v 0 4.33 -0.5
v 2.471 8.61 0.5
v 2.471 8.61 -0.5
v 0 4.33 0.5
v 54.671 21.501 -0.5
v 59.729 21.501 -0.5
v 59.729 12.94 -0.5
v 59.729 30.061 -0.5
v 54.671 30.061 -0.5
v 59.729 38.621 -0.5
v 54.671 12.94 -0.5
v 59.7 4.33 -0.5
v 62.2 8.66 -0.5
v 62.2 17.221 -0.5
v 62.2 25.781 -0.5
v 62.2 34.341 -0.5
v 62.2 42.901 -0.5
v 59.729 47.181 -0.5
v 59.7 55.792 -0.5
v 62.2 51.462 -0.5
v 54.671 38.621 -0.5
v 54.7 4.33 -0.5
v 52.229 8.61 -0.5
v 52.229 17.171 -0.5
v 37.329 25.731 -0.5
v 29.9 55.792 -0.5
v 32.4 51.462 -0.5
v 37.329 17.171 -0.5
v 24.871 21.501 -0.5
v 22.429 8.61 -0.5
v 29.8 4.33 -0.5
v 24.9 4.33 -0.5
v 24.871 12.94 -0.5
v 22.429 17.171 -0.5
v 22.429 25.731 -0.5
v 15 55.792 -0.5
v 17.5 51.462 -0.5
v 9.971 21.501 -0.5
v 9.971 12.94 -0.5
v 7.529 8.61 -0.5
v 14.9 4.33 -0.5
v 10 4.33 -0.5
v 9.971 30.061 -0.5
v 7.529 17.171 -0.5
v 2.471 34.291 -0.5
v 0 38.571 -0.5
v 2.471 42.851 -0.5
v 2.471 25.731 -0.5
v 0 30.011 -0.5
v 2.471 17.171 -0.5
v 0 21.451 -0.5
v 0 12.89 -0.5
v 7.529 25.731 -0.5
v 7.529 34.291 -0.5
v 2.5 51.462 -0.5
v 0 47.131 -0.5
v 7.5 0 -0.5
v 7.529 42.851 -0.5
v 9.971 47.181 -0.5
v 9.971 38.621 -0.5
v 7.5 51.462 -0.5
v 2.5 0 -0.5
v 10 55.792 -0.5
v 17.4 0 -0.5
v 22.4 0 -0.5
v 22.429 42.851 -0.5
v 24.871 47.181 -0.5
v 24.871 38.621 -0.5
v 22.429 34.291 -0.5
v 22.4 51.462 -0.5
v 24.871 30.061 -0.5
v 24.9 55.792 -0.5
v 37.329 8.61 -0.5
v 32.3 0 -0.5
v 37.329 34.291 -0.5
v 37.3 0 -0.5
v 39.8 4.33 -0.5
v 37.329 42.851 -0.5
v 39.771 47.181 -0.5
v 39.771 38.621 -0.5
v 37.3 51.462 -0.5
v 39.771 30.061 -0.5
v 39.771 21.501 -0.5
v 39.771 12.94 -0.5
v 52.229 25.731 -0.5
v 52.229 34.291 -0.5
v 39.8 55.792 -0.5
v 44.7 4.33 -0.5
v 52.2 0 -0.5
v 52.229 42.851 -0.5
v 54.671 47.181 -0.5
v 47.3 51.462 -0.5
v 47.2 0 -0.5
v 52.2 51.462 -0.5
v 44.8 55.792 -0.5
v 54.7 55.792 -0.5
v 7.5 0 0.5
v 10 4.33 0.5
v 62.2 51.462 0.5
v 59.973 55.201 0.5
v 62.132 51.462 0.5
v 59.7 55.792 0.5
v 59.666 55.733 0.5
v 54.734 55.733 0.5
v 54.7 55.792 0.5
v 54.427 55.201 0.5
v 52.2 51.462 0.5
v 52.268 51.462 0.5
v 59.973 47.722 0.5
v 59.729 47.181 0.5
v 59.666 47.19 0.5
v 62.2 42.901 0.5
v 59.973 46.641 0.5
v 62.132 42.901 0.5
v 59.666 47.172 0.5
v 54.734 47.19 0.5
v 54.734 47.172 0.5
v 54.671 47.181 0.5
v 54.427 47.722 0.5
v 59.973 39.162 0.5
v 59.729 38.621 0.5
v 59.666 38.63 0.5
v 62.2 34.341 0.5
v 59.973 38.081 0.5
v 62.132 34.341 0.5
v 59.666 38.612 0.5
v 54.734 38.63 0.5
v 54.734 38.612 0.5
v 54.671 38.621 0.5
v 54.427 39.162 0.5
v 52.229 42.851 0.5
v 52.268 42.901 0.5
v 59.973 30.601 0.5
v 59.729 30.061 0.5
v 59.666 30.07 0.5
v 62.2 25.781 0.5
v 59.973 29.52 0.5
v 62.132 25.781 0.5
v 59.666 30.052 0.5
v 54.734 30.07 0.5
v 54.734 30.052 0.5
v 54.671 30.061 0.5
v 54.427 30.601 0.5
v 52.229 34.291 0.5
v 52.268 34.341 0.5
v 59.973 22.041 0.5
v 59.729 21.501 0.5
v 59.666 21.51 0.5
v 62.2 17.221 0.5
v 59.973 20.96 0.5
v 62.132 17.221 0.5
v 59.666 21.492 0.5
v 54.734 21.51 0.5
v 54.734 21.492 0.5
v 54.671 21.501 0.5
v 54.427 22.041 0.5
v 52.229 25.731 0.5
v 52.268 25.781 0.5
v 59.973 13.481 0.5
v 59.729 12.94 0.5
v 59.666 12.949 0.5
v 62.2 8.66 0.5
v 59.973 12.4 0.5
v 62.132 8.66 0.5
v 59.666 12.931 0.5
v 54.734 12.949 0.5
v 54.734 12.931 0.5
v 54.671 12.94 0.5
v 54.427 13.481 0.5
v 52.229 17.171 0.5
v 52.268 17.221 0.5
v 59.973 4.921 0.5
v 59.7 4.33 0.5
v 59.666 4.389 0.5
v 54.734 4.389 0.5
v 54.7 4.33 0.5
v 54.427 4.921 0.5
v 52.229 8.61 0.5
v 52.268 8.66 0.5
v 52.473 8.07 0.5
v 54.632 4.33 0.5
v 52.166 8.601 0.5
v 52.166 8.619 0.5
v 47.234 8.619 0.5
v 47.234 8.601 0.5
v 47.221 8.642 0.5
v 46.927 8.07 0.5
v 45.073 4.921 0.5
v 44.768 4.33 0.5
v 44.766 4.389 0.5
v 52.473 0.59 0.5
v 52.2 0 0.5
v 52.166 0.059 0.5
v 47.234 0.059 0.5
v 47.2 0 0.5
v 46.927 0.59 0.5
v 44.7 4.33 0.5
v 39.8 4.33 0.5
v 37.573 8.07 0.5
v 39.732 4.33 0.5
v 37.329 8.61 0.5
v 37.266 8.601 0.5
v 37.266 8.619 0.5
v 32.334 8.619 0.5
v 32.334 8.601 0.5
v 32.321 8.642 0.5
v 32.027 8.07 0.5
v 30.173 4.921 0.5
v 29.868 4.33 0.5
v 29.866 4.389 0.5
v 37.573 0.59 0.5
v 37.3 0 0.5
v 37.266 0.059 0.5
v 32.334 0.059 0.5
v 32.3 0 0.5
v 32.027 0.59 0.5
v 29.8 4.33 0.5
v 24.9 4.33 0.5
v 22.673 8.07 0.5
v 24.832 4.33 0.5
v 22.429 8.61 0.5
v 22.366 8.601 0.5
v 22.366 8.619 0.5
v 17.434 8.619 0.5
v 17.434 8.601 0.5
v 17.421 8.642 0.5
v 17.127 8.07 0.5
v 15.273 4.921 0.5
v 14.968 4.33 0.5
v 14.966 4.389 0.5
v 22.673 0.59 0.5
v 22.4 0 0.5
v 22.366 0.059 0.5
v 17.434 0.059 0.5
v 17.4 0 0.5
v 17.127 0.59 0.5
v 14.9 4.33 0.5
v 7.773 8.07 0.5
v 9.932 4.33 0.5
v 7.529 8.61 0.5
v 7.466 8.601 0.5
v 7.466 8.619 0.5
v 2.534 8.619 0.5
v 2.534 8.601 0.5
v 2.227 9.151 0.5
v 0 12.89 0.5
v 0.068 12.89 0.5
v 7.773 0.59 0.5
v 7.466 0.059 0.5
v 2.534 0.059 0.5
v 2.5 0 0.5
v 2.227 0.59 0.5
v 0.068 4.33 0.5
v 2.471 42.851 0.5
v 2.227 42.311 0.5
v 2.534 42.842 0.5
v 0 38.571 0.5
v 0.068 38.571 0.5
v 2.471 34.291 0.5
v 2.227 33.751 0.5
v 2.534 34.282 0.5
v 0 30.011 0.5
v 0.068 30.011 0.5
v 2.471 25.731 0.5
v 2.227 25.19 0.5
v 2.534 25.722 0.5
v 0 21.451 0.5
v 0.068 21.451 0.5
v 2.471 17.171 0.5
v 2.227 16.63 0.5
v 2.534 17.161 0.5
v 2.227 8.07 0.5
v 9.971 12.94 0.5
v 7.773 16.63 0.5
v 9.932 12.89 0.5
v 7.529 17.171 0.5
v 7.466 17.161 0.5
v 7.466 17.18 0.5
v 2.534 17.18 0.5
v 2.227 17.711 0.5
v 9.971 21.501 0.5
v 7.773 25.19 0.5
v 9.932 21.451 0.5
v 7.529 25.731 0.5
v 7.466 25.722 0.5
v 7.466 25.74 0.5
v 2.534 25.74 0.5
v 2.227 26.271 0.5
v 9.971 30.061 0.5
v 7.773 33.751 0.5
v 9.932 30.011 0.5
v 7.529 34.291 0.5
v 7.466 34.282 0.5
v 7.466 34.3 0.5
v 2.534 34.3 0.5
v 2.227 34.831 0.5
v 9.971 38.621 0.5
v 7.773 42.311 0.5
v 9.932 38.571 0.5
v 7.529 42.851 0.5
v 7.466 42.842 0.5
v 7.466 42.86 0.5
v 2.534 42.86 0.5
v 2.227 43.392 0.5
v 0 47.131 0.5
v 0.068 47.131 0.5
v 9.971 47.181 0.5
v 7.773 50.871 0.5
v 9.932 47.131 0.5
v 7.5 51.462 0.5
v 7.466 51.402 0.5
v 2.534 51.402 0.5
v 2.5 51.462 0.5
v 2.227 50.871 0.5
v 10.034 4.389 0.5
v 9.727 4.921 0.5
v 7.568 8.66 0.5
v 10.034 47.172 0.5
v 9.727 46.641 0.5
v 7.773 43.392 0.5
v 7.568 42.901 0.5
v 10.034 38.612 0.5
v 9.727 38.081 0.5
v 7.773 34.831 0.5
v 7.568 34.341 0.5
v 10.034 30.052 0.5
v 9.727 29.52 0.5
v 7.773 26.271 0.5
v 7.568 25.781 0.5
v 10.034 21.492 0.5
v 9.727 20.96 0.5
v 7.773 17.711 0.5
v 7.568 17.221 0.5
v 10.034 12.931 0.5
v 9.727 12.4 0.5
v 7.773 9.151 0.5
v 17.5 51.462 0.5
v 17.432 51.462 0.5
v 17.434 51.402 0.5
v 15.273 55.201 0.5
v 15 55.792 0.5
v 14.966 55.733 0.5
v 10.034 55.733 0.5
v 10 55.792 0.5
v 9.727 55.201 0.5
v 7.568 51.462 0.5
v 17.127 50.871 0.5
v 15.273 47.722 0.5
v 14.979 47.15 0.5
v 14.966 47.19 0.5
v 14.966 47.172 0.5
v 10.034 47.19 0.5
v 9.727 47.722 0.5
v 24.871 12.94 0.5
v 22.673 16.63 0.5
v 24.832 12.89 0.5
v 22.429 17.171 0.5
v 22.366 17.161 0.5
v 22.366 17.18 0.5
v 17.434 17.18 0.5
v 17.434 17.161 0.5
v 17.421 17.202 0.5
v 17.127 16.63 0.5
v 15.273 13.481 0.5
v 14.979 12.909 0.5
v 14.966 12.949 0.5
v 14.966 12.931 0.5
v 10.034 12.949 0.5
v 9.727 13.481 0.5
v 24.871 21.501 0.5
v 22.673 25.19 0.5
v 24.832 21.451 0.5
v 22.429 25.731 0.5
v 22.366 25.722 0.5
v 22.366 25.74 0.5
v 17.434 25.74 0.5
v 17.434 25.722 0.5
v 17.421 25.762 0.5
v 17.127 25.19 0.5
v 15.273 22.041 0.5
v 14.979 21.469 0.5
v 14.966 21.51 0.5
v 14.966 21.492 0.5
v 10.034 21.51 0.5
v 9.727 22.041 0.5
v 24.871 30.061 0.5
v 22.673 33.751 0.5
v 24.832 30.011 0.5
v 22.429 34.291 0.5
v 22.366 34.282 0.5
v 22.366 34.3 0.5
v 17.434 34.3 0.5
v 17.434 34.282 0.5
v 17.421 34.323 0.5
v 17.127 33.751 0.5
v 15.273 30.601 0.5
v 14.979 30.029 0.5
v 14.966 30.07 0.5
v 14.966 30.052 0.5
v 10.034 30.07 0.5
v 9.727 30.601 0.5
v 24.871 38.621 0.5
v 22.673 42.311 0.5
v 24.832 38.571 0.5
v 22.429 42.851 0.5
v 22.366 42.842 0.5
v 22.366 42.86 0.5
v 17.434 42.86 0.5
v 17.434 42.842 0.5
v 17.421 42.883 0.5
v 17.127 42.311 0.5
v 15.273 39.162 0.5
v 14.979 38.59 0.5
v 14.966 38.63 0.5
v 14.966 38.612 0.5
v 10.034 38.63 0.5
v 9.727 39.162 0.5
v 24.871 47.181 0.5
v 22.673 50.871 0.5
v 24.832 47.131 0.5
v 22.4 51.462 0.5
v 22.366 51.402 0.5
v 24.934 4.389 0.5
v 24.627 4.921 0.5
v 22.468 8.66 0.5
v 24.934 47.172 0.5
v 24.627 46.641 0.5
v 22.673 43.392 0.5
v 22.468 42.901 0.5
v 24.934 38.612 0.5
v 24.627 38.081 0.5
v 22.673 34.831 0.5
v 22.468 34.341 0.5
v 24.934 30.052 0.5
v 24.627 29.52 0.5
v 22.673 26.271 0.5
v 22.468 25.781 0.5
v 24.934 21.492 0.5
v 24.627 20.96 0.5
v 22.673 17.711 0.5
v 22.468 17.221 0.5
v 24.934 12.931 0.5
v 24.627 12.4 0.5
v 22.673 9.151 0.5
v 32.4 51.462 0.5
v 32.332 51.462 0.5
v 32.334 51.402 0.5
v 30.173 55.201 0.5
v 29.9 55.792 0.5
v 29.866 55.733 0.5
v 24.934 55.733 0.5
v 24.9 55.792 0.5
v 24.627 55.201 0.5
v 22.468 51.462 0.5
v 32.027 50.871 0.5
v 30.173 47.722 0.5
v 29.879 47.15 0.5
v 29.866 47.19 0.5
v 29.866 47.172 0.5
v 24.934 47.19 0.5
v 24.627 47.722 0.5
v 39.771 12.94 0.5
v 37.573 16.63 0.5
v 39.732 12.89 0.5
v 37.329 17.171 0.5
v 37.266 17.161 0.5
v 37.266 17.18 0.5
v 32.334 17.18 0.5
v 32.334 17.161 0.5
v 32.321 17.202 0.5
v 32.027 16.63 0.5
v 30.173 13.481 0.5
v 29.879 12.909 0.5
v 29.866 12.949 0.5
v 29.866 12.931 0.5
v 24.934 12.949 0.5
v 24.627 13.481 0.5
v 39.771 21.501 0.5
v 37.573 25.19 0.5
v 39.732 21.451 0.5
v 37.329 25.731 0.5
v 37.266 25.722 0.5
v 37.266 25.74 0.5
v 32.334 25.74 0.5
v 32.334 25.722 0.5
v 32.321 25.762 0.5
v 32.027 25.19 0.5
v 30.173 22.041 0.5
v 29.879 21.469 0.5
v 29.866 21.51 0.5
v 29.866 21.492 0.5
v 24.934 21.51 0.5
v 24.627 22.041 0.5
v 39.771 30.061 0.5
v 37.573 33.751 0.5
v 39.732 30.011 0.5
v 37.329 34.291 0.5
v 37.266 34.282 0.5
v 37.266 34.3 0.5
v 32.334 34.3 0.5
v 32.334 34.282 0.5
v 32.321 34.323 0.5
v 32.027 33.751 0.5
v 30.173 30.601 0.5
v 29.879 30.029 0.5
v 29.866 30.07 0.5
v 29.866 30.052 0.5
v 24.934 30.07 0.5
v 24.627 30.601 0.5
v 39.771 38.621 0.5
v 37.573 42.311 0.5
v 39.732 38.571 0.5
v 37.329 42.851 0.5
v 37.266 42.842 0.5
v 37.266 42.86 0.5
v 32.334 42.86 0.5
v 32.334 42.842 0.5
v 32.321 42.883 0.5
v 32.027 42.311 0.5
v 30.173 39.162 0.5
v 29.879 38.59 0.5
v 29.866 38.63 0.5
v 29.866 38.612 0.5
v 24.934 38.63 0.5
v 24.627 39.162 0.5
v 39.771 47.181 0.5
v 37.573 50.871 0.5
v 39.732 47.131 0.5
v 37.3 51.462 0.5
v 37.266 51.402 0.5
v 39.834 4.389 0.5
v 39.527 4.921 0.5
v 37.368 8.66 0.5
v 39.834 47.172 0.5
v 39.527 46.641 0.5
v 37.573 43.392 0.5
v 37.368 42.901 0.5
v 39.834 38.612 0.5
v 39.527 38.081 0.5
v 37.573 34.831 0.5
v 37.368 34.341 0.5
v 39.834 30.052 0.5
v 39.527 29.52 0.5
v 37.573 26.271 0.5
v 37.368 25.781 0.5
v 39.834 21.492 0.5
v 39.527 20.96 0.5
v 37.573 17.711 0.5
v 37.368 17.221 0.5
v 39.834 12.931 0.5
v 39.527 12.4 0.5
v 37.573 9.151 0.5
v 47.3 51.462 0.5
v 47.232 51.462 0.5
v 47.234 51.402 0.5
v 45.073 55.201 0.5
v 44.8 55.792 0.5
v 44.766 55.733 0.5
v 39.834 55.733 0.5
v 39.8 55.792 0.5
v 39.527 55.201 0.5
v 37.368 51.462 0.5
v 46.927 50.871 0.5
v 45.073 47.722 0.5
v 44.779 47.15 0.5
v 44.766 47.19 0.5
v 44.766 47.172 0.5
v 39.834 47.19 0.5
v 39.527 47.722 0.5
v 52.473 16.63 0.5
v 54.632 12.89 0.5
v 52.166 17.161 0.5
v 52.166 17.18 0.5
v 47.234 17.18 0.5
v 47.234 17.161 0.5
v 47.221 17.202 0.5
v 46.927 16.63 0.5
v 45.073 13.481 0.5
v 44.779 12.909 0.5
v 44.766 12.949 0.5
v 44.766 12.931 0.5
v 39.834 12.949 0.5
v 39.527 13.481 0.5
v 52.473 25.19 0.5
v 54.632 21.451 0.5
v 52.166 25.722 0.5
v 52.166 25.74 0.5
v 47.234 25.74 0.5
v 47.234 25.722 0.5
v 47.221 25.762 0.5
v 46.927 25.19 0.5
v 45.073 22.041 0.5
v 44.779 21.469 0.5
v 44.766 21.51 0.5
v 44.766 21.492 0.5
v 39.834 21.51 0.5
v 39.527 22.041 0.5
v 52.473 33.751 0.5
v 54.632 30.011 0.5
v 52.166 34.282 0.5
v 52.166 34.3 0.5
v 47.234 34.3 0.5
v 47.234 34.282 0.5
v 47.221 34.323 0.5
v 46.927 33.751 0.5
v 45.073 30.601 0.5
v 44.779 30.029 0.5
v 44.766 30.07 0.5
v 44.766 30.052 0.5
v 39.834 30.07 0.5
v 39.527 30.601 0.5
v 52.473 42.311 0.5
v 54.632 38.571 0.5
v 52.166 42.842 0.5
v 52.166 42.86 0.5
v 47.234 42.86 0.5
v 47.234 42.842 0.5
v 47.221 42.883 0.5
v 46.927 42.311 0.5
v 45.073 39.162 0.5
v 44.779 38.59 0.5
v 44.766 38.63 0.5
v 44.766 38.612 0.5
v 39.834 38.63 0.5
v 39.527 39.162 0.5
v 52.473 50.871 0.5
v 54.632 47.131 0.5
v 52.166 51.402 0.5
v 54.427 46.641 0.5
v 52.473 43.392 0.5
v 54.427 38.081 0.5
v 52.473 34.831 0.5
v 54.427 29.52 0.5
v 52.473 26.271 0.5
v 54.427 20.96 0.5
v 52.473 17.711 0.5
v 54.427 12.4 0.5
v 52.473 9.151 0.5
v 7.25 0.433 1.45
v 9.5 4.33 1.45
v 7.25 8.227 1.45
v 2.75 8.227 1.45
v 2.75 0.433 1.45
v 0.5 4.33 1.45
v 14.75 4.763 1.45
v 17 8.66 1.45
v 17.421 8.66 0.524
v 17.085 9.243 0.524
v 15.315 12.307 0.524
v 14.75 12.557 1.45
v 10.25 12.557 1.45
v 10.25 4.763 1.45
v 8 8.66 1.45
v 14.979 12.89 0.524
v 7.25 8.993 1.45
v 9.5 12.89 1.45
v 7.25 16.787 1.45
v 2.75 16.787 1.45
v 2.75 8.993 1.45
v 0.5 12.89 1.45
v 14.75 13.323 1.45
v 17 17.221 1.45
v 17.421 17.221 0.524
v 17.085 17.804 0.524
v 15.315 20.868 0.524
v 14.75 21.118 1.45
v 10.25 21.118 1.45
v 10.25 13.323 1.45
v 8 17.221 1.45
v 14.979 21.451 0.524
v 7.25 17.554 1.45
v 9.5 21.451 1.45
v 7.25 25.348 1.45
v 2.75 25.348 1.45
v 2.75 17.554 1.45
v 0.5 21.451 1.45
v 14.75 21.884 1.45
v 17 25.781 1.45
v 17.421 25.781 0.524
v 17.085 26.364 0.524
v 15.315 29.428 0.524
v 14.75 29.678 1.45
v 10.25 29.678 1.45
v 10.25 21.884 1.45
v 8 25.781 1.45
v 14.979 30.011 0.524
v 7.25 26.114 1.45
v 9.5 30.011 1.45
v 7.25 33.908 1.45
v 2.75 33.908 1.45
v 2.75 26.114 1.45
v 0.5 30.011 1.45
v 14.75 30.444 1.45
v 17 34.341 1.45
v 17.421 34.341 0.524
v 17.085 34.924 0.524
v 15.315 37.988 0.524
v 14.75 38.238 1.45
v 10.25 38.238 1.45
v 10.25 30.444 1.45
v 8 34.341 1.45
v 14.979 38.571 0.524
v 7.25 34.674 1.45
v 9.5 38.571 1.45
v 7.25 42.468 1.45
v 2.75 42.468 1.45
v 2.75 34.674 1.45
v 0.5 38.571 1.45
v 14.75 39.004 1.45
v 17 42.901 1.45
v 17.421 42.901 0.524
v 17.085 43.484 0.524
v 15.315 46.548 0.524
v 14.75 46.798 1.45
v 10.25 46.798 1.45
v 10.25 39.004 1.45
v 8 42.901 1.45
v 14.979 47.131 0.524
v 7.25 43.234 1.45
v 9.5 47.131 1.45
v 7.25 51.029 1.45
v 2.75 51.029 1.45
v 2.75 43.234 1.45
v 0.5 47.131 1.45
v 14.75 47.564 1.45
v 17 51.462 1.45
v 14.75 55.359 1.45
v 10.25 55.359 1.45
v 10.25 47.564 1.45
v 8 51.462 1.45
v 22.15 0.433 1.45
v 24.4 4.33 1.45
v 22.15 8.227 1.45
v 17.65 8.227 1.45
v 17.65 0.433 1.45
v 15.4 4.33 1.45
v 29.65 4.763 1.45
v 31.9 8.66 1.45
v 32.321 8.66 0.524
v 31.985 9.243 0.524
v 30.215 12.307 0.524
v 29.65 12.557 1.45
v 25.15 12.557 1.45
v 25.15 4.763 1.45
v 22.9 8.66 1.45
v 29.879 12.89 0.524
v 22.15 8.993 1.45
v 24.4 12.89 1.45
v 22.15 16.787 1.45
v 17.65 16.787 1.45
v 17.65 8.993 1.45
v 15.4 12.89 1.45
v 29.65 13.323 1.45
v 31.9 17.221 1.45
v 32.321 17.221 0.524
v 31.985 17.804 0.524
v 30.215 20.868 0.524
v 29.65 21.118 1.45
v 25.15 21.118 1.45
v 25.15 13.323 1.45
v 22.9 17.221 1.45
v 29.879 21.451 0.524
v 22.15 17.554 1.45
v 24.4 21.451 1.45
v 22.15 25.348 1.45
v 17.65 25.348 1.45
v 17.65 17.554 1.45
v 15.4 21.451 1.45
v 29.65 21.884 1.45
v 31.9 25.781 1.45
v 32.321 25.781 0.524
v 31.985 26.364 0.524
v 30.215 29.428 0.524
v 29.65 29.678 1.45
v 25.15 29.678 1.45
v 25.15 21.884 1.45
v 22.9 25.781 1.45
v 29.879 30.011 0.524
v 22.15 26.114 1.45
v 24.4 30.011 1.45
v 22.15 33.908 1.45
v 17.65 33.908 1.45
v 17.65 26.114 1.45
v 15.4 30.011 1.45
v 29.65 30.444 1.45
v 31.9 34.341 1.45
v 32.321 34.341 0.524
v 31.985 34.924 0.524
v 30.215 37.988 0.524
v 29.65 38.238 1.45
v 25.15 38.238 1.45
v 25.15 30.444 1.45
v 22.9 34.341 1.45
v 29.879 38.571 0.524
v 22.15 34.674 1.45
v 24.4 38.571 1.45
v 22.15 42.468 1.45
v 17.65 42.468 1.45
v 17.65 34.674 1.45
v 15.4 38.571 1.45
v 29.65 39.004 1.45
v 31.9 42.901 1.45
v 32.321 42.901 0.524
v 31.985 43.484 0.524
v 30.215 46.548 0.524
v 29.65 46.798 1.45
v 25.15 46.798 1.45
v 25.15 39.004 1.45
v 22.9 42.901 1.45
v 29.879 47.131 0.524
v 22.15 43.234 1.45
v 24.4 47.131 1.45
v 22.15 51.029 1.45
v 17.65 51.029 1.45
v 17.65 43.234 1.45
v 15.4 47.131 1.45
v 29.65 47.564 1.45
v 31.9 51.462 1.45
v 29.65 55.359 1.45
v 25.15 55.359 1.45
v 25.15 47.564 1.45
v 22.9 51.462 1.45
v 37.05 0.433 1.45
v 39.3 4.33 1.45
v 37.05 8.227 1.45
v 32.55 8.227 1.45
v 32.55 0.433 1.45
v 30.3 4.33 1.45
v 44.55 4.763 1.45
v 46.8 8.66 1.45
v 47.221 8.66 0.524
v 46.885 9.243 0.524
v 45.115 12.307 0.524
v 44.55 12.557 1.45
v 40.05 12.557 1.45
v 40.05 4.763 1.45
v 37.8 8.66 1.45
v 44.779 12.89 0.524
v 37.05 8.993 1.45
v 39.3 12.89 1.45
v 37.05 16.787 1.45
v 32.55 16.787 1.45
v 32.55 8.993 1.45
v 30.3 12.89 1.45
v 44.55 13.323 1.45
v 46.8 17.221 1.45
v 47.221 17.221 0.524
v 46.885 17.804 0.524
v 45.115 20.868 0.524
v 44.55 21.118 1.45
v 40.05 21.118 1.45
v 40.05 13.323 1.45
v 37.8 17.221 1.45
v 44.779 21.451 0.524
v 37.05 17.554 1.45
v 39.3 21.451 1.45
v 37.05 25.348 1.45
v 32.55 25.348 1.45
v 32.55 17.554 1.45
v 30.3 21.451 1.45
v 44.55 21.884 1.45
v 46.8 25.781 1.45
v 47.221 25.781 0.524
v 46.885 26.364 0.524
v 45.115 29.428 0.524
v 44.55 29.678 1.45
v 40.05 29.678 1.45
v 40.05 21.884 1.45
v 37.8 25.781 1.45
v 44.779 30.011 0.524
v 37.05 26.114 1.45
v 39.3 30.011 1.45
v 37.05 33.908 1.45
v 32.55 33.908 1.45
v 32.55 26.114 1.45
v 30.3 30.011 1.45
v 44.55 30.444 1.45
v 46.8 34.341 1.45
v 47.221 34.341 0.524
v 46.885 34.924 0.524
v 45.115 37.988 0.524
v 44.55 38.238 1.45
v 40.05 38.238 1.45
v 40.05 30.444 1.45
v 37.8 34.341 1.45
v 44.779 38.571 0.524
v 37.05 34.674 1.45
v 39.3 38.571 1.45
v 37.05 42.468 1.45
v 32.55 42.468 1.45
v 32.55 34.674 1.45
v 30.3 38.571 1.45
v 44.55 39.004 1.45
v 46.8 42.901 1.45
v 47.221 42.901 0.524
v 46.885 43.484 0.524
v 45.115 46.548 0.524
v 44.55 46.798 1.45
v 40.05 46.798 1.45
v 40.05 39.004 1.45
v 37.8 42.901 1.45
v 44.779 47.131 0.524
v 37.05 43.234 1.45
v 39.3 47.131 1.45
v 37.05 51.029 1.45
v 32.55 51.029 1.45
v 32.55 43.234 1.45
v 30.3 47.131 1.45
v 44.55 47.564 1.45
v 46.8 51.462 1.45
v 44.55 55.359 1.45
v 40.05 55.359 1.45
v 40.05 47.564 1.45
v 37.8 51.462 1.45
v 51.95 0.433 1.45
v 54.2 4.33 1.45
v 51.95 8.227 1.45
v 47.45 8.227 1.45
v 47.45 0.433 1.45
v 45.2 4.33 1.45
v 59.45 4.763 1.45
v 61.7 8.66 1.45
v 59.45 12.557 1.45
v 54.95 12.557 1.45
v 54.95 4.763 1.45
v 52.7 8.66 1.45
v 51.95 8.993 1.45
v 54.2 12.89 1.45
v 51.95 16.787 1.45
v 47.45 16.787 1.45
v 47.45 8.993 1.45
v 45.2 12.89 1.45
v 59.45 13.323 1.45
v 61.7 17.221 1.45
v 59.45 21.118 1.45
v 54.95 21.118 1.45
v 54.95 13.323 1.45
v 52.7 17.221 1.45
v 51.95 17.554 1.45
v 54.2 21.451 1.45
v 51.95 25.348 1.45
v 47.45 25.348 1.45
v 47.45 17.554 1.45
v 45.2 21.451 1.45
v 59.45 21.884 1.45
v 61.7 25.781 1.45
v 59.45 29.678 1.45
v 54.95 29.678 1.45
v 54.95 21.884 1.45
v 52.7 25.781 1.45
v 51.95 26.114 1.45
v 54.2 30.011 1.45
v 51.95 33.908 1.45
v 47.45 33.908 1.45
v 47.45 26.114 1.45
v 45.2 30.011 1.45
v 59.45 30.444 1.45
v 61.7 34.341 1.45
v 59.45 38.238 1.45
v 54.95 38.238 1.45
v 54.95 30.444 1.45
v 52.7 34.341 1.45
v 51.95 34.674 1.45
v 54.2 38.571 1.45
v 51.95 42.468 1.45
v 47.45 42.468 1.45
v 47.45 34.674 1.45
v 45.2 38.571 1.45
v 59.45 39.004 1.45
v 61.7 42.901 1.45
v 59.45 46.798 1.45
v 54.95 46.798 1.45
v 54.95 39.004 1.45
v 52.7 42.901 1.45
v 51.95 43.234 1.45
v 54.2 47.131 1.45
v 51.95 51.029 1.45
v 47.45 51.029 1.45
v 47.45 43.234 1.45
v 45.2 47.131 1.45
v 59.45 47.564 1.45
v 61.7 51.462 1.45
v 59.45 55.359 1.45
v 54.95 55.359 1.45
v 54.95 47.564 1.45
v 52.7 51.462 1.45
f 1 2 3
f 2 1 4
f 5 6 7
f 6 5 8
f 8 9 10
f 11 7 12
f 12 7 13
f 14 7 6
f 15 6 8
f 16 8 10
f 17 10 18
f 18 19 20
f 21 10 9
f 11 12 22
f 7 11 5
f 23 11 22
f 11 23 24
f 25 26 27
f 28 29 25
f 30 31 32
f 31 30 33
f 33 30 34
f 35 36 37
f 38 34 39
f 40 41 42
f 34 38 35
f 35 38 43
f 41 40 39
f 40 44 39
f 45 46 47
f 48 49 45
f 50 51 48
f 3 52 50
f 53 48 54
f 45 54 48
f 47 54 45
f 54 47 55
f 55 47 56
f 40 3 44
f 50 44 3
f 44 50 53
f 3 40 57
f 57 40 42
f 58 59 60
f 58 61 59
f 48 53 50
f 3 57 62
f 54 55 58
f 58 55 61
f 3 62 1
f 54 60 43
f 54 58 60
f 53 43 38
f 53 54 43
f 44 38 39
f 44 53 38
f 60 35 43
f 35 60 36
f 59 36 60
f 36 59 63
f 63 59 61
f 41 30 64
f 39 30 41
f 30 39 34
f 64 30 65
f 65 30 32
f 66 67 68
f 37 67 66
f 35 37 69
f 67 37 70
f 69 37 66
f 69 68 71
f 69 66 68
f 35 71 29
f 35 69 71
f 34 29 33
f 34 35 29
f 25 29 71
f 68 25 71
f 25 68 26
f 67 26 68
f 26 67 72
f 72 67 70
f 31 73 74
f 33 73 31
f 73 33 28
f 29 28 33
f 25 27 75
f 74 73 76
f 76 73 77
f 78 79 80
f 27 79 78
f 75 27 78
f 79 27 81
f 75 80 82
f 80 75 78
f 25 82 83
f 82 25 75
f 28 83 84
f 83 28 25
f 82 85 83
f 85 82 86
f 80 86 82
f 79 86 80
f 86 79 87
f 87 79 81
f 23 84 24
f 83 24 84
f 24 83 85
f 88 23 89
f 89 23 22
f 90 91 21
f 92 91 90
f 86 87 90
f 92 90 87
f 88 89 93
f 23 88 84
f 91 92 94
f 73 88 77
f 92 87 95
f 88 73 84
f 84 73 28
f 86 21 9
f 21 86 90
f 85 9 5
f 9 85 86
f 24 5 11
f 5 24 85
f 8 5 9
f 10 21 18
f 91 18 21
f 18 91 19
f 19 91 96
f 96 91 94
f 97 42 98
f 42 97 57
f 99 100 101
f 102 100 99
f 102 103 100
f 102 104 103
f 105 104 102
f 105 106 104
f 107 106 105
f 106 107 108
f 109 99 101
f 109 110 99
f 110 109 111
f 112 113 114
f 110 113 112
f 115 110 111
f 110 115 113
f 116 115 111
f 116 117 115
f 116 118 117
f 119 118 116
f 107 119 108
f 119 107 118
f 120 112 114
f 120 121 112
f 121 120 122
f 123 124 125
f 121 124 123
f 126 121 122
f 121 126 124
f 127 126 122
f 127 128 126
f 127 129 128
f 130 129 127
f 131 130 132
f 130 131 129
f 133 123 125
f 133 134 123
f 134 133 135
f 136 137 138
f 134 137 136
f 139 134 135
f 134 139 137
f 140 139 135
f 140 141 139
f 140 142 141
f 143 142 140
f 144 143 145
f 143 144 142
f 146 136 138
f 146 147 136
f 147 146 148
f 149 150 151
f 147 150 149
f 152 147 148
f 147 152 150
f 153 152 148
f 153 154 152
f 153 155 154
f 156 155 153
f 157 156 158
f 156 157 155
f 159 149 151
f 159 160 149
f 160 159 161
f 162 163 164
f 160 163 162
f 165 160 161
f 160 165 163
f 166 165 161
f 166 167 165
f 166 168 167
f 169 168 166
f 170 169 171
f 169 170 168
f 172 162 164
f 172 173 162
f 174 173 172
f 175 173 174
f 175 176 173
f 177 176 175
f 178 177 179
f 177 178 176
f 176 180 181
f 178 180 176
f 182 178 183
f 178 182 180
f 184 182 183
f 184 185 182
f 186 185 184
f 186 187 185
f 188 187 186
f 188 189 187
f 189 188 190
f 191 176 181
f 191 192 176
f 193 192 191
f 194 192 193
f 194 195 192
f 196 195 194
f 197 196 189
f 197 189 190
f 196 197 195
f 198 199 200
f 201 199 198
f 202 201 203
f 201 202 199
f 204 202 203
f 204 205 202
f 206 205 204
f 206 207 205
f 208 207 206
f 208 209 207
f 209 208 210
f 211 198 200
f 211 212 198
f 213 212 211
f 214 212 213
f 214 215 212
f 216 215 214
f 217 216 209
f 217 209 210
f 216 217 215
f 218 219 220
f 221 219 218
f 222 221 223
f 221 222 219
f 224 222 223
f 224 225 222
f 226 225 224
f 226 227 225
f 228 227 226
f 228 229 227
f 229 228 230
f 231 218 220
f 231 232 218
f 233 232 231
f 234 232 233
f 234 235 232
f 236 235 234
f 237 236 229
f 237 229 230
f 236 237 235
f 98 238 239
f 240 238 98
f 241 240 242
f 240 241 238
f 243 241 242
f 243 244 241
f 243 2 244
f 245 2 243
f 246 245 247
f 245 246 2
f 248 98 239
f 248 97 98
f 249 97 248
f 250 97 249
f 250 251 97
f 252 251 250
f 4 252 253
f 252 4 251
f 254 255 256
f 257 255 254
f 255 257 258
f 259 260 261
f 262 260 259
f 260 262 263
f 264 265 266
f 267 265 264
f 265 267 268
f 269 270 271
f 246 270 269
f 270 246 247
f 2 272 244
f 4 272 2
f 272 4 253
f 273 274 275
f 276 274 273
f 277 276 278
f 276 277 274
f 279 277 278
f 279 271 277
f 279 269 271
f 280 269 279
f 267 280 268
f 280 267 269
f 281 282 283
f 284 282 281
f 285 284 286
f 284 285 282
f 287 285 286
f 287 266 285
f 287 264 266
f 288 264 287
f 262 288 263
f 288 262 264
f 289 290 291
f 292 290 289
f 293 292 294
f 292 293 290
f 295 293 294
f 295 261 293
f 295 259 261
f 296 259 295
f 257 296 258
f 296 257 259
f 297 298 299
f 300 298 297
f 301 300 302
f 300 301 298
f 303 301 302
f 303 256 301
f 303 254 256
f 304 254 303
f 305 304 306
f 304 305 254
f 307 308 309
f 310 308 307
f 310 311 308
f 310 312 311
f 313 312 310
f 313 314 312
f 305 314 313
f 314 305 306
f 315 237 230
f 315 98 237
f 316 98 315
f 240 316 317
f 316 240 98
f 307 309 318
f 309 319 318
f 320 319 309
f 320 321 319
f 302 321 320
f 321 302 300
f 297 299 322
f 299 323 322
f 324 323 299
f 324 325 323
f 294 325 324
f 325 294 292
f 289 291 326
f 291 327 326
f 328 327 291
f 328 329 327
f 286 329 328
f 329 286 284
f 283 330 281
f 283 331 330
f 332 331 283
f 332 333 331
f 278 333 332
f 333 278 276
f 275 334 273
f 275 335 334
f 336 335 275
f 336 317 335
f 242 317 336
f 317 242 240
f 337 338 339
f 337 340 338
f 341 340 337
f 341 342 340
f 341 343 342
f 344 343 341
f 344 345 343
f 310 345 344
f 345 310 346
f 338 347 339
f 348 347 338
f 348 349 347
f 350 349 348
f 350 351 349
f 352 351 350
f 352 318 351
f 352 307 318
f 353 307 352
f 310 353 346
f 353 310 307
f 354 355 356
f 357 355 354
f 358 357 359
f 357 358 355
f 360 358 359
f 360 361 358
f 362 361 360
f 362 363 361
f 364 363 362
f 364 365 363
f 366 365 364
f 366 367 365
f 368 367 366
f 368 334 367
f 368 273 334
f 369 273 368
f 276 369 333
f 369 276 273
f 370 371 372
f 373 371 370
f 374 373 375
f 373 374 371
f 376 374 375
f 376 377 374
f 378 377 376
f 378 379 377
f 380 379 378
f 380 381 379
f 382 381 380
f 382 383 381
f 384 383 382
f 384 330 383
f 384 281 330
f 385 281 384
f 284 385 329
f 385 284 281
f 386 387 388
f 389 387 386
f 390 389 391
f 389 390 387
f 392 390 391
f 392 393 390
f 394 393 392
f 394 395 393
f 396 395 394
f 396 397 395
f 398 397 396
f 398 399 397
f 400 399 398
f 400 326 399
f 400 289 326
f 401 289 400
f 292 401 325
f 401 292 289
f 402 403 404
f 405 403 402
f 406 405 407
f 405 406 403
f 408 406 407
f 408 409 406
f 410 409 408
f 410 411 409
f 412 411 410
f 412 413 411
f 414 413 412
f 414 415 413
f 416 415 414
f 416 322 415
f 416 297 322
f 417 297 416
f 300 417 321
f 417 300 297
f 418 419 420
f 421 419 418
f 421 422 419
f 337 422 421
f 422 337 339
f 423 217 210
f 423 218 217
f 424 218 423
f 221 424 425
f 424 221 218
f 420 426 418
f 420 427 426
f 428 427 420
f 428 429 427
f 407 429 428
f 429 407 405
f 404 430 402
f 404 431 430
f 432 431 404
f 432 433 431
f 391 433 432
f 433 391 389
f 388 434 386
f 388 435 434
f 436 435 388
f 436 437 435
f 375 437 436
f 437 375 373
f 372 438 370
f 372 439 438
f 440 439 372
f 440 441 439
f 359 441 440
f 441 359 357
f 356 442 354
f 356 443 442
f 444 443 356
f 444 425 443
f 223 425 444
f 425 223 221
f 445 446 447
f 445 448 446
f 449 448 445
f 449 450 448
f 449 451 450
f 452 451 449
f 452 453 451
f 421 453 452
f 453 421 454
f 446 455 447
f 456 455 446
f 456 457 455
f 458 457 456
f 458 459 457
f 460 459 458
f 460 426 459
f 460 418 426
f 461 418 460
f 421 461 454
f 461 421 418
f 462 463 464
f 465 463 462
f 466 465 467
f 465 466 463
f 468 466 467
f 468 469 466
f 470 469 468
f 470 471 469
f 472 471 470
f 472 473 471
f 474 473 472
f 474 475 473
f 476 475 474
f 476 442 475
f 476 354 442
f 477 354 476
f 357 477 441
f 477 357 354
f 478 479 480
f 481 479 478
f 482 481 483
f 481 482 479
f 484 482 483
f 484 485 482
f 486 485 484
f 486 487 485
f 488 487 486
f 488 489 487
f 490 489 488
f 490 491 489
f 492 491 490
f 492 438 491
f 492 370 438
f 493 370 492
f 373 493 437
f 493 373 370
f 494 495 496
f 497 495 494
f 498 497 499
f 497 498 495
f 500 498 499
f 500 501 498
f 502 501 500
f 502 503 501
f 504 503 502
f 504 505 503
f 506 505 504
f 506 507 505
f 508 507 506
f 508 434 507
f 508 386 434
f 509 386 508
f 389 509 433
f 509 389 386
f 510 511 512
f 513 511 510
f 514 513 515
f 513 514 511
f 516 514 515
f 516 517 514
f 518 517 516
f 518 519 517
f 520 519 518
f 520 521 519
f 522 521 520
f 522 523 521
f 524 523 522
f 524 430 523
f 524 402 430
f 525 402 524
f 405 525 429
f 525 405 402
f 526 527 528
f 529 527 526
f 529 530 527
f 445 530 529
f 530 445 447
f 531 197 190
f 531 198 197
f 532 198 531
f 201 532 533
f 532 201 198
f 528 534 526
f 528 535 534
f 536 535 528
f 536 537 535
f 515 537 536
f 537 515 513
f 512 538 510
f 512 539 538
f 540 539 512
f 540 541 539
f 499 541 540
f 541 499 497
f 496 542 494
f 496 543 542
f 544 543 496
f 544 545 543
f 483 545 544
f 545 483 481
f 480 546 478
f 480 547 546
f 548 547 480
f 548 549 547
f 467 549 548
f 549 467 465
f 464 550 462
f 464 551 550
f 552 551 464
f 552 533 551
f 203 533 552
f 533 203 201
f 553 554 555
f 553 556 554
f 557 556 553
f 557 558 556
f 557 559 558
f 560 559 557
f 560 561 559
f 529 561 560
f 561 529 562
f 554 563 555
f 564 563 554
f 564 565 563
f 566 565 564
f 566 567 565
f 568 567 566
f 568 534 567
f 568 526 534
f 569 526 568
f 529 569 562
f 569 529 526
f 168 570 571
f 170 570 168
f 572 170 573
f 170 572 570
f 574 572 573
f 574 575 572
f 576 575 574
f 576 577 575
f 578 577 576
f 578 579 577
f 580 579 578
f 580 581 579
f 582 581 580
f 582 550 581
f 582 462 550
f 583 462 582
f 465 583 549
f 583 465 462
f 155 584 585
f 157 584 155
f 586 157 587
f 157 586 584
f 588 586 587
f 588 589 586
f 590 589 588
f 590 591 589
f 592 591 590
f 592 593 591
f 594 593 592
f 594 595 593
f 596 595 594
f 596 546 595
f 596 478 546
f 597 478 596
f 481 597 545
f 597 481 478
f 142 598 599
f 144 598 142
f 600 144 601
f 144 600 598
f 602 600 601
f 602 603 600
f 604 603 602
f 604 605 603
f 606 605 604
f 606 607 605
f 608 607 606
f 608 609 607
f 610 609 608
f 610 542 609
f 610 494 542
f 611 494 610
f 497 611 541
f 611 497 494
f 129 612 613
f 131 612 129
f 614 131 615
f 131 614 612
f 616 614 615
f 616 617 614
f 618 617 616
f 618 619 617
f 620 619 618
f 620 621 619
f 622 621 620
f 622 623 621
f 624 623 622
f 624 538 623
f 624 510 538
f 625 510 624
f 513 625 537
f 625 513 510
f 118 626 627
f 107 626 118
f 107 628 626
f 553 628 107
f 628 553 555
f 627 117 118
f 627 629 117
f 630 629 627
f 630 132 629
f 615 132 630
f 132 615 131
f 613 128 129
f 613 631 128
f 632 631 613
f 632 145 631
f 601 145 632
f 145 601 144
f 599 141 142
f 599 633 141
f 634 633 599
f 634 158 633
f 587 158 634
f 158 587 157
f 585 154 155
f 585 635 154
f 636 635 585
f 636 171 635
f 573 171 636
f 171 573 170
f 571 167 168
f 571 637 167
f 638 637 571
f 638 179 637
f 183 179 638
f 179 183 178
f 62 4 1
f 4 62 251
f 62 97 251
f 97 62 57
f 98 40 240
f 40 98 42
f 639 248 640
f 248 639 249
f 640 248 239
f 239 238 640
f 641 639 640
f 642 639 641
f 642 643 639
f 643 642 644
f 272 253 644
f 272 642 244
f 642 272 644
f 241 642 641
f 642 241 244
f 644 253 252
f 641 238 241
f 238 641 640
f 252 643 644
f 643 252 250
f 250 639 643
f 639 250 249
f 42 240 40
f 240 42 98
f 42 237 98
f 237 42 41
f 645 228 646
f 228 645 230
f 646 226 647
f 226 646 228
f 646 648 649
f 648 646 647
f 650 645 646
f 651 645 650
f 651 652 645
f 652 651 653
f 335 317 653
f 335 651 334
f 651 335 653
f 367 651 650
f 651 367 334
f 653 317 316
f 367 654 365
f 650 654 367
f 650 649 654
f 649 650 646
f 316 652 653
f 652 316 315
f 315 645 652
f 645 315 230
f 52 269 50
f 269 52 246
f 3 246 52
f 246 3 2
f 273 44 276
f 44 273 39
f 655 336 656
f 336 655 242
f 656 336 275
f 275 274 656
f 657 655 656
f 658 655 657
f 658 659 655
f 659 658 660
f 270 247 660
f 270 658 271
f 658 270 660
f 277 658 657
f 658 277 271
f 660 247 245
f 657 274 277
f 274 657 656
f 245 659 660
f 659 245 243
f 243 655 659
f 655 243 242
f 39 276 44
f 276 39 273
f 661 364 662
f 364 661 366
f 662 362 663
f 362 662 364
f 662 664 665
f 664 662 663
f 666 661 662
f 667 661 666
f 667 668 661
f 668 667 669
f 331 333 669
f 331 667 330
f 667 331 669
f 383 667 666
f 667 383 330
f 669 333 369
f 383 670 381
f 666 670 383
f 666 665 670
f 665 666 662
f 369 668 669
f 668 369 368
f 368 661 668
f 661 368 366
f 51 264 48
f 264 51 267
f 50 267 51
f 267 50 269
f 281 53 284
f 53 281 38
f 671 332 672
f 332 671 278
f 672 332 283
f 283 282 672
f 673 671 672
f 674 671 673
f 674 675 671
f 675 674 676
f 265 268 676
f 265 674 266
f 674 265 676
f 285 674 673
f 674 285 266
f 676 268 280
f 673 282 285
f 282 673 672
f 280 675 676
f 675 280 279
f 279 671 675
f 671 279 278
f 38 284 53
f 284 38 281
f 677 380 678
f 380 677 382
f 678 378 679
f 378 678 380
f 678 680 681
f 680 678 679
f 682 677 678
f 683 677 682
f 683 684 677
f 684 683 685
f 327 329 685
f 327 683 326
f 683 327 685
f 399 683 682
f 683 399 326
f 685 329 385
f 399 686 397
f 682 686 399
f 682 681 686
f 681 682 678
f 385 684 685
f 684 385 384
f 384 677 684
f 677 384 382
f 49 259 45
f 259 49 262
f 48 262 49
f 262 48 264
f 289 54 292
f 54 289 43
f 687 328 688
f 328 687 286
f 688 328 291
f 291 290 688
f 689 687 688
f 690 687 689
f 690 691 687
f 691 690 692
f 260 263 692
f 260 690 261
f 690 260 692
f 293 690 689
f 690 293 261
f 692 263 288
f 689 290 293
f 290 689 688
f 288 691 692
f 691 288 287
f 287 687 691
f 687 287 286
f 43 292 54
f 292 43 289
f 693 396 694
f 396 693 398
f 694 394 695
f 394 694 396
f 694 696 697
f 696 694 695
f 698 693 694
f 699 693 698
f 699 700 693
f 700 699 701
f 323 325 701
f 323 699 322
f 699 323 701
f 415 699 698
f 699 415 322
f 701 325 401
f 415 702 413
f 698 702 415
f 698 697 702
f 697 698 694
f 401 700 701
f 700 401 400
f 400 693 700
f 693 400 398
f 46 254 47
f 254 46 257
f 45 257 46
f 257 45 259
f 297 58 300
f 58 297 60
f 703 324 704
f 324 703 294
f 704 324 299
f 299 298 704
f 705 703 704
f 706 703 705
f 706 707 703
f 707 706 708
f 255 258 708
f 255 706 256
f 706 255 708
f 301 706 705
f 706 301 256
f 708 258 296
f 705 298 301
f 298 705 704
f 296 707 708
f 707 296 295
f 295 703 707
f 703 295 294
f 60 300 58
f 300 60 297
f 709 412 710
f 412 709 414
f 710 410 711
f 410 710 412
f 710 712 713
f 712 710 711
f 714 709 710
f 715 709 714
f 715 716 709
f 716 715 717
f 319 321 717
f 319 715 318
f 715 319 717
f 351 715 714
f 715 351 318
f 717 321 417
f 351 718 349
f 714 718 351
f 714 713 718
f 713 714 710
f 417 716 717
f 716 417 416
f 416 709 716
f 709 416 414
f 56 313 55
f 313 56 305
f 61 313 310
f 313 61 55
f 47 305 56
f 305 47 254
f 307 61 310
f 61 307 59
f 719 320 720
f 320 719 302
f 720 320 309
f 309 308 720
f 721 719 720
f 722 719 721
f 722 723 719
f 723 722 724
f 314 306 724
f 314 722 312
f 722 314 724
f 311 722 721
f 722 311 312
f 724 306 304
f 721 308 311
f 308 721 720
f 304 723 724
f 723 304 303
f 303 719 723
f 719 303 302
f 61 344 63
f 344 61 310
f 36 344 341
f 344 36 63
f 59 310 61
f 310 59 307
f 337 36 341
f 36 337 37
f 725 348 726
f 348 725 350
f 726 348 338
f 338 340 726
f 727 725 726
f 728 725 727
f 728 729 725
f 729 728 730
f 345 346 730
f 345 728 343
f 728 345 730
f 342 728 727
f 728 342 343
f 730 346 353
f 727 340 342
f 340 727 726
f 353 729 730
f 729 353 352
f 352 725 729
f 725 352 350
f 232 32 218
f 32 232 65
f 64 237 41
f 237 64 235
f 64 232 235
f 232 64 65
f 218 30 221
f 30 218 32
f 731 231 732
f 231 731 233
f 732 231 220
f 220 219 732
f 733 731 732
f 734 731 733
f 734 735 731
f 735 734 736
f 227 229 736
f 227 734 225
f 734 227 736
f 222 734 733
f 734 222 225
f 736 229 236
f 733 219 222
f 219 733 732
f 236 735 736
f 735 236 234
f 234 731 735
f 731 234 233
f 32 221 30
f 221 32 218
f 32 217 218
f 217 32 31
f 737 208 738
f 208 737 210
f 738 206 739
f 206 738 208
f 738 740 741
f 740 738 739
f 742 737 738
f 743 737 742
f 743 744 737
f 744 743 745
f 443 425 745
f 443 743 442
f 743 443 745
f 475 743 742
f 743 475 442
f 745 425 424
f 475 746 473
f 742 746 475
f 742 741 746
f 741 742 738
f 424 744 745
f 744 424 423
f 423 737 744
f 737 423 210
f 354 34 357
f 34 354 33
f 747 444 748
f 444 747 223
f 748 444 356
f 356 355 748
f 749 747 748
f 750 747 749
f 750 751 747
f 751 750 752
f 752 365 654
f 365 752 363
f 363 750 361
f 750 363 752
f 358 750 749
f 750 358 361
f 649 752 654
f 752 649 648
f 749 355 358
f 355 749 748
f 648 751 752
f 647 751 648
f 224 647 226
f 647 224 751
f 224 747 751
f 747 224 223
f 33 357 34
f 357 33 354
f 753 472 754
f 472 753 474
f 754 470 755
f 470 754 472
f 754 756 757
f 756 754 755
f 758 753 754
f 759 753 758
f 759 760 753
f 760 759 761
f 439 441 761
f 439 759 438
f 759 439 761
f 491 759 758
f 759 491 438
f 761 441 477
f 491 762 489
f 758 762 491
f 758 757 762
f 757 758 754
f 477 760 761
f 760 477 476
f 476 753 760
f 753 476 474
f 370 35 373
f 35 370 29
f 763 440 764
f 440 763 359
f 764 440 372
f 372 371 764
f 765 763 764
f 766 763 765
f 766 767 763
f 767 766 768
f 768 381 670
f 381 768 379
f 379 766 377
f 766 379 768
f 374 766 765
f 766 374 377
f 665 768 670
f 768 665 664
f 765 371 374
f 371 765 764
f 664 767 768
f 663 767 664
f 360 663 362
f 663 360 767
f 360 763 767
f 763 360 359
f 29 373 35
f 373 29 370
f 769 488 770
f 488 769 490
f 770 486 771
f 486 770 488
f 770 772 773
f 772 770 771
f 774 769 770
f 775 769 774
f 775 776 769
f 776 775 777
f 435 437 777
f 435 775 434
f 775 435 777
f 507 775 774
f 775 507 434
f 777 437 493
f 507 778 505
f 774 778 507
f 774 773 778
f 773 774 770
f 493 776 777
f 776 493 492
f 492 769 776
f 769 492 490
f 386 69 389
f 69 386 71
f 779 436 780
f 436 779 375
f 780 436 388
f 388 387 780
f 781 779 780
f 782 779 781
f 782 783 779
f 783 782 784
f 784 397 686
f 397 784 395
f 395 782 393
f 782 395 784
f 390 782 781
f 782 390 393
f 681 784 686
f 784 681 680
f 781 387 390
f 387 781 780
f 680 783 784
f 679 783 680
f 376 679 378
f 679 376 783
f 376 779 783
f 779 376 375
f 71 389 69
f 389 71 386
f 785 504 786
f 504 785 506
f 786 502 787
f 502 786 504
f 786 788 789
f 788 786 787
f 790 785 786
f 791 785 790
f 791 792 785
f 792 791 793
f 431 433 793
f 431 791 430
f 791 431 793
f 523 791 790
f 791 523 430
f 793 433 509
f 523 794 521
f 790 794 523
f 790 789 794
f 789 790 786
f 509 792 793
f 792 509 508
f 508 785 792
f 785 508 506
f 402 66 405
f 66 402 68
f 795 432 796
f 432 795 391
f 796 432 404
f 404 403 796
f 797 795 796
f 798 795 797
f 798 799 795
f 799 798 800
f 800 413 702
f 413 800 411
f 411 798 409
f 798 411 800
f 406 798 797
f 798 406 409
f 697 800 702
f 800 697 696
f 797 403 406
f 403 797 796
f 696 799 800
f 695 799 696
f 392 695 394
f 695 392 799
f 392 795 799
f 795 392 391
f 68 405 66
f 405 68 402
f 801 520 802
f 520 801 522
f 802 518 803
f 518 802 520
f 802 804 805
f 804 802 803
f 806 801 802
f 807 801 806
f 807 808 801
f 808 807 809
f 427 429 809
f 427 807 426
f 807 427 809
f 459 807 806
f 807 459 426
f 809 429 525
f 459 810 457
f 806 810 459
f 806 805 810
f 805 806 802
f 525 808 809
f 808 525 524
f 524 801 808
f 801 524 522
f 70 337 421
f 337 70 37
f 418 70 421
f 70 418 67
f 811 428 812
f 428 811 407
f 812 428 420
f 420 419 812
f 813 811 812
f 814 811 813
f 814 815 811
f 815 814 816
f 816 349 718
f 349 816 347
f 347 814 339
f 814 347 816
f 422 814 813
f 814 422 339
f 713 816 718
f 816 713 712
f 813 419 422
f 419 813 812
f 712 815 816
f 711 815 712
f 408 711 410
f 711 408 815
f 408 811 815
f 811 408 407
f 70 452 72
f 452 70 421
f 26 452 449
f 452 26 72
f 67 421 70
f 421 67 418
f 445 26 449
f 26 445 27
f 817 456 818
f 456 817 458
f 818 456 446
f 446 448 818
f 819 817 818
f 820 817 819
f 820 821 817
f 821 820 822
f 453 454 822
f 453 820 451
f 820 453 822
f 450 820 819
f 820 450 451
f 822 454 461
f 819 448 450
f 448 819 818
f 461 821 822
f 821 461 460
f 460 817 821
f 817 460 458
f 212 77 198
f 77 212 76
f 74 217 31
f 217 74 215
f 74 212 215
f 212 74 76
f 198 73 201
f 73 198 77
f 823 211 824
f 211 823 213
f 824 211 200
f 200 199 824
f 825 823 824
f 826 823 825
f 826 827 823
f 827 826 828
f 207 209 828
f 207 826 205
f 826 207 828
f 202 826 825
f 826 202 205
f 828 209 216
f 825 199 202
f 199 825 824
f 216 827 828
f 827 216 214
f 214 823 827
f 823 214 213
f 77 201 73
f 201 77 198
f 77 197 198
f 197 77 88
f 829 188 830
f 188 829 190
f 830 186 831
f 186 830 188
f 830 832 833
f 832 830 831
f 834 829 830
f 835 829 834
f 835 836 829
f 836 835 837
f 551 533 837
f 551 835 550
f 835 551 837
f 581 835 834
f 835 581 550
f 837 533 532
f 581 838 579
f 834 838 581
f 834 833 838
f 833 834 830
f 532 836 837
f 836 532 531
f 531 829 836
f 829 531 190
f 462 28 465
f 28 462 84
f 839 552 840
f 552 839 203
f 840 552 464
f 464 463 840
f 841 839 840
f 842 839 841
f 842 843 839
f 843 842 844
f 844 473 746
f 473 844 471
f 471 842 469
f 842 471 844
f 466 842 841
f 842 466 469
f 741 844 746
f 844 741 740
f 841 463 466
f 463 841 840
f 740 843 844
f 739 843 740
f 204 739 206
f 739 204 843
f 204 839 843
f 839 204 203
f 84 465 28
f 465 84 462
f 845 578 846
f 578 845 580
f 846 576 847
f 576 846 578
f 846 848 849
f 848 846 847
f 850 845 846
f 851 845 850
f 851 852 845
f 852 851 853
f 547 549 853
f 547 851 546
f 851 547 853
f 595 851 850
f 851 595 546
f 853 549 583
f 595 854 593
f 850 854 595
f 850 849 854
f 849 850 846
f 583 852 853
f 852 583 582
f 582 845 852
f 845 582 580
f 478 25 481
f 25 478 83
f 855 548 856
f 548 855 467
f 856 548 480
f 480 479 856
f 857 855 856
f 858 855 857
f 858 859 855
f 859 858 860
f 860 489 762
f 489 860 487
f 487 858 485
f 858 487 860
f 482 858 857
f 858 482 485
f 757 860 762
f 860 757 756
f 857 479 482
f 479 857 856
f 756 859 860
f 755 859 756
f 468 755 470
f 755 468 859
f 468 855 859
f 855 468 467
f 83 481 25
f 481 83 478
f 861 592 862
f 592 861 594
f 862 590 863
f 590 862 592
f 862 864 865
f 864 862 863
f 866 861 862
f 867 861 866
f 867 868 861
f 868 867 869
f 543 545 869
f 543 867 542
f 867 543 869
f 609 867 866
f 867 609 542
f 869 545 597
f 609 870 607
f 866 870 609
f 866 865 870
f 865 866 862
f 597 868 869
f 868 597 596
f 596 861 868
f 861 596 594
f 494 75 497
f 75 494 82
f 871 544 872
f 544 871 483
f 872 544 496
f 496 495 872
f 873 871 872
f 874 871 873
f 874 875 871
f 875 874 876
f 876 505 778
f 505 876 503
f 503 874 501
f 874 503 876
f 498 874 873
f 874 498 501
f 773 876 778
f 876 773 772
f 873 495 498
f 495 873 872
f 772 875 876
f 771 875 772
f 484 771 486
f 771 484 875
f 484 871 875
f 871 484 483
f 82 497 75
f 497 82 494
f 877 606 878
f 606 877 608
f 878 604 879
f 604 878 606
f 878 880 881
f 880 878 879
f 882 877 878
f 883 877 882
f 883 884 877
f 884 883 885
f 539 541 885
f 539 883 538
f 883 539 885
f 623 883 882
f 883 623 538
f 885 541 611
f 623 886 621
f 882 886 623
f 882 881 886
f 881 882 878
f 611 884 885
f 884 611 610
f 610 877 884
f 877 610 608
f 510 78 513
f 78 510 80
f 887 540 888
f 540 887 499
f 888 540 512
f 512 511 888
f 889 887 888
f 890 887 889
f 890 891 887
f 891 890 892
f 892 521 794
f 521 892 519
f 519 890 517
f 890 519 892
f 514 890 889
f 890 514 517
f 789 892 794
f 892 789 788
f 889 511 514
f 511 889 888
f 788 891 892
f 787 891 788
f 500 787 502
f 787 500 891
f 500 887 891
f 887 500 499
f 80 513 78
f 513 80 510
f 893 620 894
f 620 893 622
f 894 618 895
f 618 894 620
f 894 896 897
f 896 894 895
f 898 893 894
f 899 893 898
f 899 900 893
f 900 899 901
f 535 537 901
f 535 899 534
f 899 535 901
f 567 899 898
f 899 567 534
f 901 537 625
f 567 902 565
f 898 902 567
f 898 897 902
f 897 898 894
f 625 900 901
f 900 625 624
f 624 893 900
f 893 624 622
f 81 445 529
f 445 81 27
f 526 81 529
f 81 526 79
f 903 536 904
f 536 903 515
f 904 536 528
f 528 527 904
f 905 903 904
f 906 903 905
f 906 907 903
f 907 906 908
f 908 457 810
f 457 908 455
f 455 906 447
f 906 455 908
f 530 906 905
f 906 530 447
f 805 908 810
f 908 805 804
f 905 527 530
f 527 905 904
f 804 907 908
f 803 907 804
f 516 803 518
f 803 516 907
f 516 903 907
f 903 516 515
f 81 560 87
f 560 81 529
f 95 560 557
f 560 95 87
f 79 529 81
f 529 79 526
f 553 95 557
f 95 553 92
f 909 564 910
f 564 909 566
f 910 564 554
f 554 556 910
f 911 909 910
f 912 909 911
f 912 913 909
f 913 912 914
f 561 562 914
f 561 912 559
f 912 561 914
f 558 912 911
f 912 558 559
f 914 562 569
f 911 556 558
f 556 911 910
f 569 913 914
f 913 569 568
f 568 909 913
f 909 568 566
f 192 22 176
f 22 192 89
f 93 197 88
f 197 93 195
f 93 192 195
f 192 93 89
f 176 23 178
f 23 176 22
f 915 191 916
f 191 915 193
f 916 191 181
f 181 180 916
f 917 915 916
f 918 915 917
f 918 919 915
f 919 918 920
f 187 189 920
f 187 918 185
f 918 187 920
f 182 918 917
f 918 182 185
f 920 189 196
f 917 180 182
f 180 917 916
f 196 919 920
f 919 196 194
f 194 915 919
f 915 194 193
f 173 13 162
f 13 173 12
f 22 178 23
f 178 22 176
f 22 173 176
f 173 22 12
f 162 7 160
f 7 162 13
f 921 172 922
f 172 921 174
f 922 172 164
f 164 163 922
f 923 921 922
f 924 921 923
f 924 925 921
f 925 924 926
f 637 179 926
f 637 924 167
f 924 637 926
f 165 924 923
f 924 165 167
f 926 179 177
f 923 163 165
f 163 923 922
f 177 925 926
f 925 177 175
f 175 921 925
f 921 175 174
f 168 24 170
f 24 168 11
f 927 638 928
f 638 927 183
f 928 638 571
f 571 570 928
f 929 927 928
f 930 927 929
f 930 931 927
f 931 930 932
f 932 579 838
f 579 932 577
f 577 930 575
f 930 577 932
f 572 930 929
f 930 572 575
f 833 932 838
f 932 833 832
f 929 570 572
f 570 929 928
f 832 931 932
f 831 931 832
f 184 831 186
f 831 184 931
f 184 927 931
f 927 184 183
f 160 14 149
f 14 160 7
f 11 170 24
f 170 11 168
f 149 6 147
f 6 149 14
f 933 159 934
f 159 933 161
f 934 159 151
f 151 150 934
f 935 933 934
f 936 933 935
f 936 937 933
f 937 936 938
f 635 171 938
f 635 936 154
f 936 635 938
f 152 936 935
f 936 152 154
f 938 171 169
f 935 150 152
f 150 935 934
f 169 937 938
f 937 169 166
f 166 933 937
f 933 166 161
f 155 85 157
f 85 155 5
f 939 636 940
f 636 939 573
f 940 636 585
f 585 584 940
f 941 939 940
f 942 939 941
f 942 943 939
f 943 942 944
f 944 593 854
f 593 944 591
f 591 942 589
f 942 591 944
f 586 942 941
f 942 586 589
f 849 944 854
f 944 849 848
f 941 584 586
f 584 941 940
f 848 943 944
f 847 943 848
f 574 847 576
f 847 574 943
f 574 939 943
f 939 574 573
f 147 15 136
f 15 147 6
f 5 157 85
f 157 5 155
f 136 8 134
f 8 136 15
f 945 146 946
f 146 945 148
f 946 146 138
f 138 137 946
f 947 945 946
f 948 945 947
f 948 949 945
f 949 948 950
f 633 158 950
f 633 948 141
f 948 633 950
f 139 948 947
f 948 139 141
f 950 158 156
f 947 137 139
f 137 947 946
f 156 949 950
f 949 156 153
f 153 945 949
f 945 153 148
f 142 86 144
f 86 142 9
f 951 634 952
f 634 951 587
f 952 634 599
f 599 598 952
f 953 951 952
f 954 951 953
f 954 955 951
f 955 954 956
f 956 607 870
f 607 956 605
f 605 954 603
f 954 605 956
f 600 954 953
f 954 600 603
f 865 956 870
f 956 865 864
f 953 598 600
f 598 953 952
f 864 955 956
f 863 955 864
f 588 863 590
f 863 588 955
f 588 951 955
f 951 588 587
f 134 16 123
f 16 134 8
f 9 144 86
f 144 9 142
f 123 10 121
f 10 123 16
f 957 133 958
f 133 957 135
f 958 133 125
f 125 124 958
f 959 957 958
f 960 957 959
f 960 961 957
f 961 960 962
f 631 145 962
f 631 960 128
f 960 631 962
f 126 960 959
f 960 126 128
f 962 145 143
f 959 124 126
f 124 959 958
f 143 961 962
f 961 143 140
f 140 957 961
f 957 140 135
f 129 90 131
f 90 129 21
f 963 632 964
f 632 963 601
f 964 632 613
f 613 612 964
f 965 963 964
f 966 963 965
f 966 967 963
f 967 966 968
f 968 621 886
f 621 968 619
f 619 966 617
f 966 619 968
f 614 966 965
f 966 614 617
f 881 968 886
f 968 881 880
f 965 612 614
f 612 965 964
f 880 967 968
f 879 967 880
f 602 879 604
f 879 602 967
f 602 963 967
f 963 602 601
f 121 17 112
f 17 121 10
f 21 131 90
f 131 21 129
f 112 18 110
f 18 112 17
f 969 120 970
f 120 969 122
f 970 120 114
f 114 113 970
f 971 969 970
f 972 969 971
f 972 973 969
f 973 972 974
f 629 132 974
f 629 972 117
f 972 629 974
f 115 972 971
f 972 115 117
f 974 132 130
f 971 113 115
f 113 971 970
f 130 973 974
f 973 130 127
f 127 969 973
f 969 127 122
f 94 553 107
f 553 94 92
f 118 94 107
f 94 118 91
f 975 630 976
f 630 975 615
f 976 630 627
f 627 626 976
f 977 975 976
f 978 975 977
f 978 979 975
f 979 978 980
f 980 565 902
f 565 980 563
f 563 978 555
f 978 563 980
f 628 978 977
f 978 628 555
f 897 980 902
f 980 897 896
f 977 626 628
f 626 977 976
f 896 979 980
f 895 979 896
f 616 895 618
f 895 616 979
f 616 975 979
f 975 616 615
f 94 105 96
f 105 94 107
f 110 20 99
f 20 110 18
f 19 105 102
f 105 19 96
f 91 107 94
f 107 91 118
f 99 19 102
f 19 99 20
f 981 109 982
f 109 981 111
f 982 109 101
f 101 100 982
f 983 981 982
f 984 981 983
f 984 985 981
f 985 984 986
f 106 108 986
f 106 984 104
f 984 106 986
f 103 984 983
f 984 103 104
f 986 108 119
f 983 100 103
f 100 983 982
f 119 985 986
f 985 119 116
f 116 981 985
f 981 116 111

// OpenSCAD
// file: hexagon.scad
/*
 * Copyright (c) 2014 by Tobias Prinz
 * Multi-licensed under MIT, APL2 and GPL3.0
 */

module filled_equilateral_hexagon (sidelength) {
  s = sidelength;
  h = cos(30)*s;
  polygon(points=[[-s/2,-h],[-s,0],[-s/2,+h],[+s/2,+h],[s,0],[+s/2,-h]], paths=[[0,1,2,3,4,5]]);
}

module bordered_equilateral_hexagon (s1, width) {
  h2 = cos(30) * s1 - width;
  s2 = h2 / cos(30);
  difference() {
	filled_equilateral_hexagon(s1);
	filled_equilateral_hexagon(s2);
  }
}

module hex_f (s) {
	filled_equilateral_hexagon(s);
}

module hex_b (s, w) {
	bordered_equilateral_hexagon(s,w);
}
// main file
/*
 * Copyright (c) 2014 by Tobias Prinz
 * Multi-licensed under MIT, APL2 and GPL3.0
 */

include <hexagon.scad>

overlap = 0.1; // Overlap for watertight printing

module tile1(width=10) {
	linear_extrude(height=2, center=true, convexity=10, twist=0)
		hex_f(width);
}

module tile2(width=10, thickness=2) {
	linear_extrude(height=1, center=true, convexity=10, twist=0)
		hex_f(width);
	translate([0, 0, 1-overlap])
		linear_extrude(height=1 + overlap, center=true, convexity=10, twist=0)
			hex_b(width, thickness);
}


module tile3(width=10) {
	linear_extrude(height=1, center=true, convexity=10, twist=0)
		hex_f(width);
	translate([0, 0, 1 - overlap])
		linear_extrude(height=1 + overlap, center=true, convexity=10, twist=0, scale=[0.9, 0.9], $fn=100)
			hex_f(width);
}

module area3(width, height, size) {
	num_vert = floor(width / (size * 3));
	offset = cos(30) * size;
	num_hori = floor(height / (offset * 2));

	for(v = [0:num_vert]) {
		for(h = [0:num_hori]) {
			translate([v * (size * 3 - overlap) + size , h * (offset * 2 - overlap) + offset, 0])
				color([v / num_vert, h / num_hori, .8, 1])
					tile3(size);
			translate([v * (size * 3 - overlap) + size * 2.5 , h * (offset * 2 - overlap) + offset * 2, 0])
				color([v / num_vert, h / num_hori, 1, 1])
					tile3(size);
		}
	}
}

area3(50,50,5);
